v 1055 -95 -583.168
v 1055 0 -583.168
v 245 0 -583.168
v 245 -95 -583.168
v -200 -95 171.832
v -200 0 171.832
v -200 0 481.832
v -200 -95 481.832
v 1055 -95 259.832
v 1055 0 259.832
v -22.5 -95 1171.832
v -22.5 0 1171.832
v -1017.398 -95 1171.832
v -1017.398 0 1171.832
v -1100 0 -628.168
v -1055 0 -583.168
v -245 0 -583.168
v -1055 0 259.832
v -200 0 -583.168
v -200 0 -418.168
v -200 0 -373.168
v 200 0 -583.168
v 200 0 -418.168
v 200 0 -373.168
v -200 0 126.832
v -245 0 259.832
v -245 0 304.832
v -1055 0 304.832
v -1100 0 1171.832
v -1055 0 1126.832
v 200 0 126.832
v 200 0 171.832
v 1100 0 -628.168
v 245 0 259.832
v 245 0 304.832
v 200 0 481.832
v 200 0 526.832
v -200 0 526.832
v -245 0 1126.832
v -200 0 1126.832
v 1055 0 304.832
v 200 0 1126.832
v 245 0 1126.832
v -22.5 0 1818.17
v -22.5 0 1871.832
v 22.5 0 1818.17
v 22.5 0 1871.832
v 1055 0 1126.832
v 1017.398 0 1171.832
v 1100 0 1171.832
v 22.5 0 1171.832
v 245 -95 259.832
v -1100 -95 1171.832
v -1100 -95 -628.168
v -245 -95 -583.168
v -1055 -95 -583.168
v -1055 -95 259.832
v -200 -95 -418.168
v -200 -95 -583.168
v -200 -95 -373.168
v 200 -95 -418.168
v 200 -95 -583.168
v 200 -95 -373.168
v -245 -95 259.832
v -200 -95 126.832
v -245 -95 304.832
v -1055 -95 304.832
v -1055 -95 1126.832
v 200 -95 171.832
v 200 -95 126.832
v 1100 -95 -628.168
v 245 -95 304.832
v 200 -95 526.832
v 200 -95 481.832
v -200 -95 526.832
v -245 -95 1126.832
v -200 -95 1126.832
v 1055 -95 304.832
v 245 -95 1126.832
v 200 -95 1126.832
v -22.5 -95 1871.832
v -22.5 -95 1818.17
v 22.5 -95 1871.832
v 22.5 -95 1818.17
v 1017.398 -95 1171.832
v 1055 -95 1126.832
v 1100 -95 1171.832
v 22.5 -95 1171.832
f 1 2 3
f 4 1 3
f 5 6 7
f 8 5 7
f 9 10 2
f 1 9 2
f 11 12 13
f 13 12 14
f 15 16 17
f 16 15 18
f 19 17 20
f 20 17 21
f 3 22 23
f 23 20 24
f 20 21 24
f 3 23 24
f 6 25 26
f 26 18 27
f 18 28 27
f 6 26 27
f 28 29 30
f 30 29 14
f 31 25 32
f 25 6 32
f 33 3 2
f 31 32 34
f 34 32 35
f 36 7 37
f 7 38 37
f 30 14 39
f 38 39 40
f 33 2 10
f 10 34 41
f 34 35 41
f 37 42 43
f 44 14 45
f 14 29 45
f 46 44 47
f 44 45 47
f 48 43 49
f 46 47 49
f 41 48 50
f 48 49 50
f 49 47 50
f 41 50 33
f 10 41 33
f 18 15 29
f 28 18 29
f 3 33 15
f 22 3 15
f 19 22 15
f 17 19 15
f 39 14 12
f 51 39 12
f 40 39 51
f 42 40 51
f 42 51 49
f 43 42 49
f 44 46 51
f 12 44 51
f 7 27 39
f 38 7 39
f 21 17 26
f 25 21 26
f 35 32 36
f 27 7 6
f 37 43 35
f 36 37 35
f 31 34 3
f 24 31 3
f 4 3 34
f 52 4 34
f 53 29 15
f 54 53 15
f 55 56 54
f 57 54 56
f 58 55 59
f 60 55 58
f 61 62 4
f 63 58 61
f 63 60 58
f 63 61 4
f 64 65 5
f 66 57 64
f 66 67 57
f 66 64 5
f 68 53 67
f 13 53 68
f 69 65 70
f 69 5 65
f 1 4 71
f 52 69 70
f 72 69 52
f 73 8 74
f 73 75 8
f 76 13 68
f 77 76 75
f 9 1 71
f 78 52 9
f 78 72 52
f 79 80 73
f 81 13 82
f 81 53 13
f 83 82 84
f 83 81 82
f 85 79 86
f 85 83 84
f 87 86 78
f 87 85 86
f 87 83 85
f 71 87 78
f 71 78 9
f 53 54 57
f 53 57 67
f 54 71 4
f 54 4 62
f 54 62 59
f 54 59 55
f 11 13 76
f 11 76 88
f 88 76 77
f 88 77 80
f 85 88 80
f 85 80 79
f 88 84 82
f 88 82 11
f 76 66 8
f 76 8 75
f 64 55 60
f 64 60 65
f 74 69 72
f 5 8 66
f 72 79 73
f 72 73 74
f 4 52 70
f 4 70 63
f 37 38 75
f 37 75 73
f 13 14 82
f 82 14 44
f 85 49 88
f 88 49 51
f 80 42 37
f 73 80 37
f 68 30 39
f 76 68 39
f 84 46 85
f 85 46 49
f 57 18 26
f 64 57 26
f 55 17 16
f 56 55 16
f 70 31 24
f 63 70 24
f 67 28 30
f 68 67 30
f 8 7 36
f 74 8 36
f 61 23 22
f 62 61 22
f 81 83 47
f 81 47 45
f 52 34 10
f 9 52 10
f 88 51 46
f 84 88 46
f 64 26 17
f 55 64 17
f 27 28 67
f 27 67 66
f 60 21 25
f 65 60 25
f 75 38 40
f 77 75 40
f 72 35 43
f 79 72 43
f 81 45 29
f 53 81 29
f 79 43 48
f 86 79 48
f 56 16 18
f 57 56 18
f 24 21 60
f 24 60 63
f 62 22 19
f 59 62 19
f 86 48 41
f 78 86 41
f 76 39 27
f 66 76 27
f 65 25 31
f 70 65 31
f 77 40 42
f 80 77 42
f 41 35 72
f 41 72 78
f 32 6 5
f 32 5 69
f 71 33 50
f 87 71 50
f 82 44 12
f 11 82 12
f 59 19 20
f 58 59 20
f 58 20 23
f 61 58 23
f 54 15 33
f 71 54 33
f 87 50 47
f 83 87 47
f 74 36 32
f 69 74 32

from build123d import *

# Parameters (mm, degrees)
F0_W     = 810
F0_H     = 45
F0_W_2   = 400
F1_DEPTH = 95


# Not quite as in the source:
# - a feature names something its author has since deleted; it is built from what else it names


with BuildPart() as f1:
    # F0 (on Front) → F1 (new body)
    with BuildSketch(Plane.XZ):
        Polygon((1100, -628.1681121112), (1100, -583.1681121112), (1055, -583.1681121112), (245, -583.1681121112), (200, -583.1681121112), (-200, -583.1681121112), (-245, -583.1681121112), (-1055, -583.1681121112), (-1100, -583.1681121112), (-1100, -628.1681121112), align=None)
        Polygon((1055, -583.1681121112), (1100, -583.1681121112), (1100, 1126.8318878888), (1055, 1126.8318878888), (1055, 304.8318878888), (1055, 259.8318878888), align=None)
        Polygon((1055, 1126.8318878888), (1100, 1126.8318878888), (1100, 1171.8318878888), (1017.398329114, 1171.8318878888), (22.5, 1171.8318878888), (-22.5, 1171.8318878888), (-1017.398329114, 1171.8318878888), (-1100, 1171.8318878888), (-1100, 1126.8318878888), (-1055, 1126.8318878888), (-245, 1126.8318878888), (-200, 1126.8318878888), (200, 1126.8318878888), (245, 1126.8318878888), align=None)
        Polygon((1017.398329114, 1171.8318878888), (1100, 1171.8318878888), (22.5, 1871.8318878888), (22.5, 1818.1695494942), align=None)
        Polygon((-1100, 1126.8318878888), (-1100, -583.1681121112), (-1055, -583.1681121112), (-1055, 259.8318878888), (-1055, 304.8318878888), (-1055, 1126.8318878888), align=None)
        Polygon((22.5, 1818.1695494942), (22.5, 1871.8318878888), (-22.5, 1871.8318878888), (-22.5, 1818.1695494942), (-22.5, 1171.8318878888), (22.5, 1171.8318878888), align=None)
        Polygon((-22.5, 1818.1695494942), (-22.5, 1871.8318878888), (-1100, 1171.8318878888), (-1017.398329114, 1171.8318878888), align=None)
        Polygon((-245, -583.1681121112), (-200, -583.1681121112), (-200, -418.1681121112), (-200, -373.1681121112), (-200, 126.8318878888), (-200, 171.8318878888), (-200, 481.8318878888), (-200, 526.8318878888), (-200, 1126.8318878888), (-245, 1126.8318878888), (-245, 304.8318878888), (-245, 259.8318878888), align=None)
        Polygon((200, -583.1681121112), (245, -583.1681121112), (245, 259.8318878888), (245, 304.8318878888), (245, 1126.8318878888), (200, 1126.8318878888), (200, 526.8318878888), (200, 481.8318878888), (200, 171.8318878888), (200, 126.8318878888), (200, -373.1681121112), (200, -418.1681121112), align=None)
        with Locations((-650, 282.3318878888)):
            Rectangle(F0_W, F0_H)
        with Locations((0, -395.6681121112)):
            Rectangle(F0_W_2, F0_H)
        with Locations((0, 149.3318878888)):
            Rectangle(F0_W_2, F0_H)
        with Locations((650, 282.3318878888)):
            Rectangle(F0_W, F0_H)
        with Locations((0, 504.3318878888)):
            Rectangle(F0_W_2, F0_H)
    extrude(amount=F1_DEPTH)


solid = f1.part
